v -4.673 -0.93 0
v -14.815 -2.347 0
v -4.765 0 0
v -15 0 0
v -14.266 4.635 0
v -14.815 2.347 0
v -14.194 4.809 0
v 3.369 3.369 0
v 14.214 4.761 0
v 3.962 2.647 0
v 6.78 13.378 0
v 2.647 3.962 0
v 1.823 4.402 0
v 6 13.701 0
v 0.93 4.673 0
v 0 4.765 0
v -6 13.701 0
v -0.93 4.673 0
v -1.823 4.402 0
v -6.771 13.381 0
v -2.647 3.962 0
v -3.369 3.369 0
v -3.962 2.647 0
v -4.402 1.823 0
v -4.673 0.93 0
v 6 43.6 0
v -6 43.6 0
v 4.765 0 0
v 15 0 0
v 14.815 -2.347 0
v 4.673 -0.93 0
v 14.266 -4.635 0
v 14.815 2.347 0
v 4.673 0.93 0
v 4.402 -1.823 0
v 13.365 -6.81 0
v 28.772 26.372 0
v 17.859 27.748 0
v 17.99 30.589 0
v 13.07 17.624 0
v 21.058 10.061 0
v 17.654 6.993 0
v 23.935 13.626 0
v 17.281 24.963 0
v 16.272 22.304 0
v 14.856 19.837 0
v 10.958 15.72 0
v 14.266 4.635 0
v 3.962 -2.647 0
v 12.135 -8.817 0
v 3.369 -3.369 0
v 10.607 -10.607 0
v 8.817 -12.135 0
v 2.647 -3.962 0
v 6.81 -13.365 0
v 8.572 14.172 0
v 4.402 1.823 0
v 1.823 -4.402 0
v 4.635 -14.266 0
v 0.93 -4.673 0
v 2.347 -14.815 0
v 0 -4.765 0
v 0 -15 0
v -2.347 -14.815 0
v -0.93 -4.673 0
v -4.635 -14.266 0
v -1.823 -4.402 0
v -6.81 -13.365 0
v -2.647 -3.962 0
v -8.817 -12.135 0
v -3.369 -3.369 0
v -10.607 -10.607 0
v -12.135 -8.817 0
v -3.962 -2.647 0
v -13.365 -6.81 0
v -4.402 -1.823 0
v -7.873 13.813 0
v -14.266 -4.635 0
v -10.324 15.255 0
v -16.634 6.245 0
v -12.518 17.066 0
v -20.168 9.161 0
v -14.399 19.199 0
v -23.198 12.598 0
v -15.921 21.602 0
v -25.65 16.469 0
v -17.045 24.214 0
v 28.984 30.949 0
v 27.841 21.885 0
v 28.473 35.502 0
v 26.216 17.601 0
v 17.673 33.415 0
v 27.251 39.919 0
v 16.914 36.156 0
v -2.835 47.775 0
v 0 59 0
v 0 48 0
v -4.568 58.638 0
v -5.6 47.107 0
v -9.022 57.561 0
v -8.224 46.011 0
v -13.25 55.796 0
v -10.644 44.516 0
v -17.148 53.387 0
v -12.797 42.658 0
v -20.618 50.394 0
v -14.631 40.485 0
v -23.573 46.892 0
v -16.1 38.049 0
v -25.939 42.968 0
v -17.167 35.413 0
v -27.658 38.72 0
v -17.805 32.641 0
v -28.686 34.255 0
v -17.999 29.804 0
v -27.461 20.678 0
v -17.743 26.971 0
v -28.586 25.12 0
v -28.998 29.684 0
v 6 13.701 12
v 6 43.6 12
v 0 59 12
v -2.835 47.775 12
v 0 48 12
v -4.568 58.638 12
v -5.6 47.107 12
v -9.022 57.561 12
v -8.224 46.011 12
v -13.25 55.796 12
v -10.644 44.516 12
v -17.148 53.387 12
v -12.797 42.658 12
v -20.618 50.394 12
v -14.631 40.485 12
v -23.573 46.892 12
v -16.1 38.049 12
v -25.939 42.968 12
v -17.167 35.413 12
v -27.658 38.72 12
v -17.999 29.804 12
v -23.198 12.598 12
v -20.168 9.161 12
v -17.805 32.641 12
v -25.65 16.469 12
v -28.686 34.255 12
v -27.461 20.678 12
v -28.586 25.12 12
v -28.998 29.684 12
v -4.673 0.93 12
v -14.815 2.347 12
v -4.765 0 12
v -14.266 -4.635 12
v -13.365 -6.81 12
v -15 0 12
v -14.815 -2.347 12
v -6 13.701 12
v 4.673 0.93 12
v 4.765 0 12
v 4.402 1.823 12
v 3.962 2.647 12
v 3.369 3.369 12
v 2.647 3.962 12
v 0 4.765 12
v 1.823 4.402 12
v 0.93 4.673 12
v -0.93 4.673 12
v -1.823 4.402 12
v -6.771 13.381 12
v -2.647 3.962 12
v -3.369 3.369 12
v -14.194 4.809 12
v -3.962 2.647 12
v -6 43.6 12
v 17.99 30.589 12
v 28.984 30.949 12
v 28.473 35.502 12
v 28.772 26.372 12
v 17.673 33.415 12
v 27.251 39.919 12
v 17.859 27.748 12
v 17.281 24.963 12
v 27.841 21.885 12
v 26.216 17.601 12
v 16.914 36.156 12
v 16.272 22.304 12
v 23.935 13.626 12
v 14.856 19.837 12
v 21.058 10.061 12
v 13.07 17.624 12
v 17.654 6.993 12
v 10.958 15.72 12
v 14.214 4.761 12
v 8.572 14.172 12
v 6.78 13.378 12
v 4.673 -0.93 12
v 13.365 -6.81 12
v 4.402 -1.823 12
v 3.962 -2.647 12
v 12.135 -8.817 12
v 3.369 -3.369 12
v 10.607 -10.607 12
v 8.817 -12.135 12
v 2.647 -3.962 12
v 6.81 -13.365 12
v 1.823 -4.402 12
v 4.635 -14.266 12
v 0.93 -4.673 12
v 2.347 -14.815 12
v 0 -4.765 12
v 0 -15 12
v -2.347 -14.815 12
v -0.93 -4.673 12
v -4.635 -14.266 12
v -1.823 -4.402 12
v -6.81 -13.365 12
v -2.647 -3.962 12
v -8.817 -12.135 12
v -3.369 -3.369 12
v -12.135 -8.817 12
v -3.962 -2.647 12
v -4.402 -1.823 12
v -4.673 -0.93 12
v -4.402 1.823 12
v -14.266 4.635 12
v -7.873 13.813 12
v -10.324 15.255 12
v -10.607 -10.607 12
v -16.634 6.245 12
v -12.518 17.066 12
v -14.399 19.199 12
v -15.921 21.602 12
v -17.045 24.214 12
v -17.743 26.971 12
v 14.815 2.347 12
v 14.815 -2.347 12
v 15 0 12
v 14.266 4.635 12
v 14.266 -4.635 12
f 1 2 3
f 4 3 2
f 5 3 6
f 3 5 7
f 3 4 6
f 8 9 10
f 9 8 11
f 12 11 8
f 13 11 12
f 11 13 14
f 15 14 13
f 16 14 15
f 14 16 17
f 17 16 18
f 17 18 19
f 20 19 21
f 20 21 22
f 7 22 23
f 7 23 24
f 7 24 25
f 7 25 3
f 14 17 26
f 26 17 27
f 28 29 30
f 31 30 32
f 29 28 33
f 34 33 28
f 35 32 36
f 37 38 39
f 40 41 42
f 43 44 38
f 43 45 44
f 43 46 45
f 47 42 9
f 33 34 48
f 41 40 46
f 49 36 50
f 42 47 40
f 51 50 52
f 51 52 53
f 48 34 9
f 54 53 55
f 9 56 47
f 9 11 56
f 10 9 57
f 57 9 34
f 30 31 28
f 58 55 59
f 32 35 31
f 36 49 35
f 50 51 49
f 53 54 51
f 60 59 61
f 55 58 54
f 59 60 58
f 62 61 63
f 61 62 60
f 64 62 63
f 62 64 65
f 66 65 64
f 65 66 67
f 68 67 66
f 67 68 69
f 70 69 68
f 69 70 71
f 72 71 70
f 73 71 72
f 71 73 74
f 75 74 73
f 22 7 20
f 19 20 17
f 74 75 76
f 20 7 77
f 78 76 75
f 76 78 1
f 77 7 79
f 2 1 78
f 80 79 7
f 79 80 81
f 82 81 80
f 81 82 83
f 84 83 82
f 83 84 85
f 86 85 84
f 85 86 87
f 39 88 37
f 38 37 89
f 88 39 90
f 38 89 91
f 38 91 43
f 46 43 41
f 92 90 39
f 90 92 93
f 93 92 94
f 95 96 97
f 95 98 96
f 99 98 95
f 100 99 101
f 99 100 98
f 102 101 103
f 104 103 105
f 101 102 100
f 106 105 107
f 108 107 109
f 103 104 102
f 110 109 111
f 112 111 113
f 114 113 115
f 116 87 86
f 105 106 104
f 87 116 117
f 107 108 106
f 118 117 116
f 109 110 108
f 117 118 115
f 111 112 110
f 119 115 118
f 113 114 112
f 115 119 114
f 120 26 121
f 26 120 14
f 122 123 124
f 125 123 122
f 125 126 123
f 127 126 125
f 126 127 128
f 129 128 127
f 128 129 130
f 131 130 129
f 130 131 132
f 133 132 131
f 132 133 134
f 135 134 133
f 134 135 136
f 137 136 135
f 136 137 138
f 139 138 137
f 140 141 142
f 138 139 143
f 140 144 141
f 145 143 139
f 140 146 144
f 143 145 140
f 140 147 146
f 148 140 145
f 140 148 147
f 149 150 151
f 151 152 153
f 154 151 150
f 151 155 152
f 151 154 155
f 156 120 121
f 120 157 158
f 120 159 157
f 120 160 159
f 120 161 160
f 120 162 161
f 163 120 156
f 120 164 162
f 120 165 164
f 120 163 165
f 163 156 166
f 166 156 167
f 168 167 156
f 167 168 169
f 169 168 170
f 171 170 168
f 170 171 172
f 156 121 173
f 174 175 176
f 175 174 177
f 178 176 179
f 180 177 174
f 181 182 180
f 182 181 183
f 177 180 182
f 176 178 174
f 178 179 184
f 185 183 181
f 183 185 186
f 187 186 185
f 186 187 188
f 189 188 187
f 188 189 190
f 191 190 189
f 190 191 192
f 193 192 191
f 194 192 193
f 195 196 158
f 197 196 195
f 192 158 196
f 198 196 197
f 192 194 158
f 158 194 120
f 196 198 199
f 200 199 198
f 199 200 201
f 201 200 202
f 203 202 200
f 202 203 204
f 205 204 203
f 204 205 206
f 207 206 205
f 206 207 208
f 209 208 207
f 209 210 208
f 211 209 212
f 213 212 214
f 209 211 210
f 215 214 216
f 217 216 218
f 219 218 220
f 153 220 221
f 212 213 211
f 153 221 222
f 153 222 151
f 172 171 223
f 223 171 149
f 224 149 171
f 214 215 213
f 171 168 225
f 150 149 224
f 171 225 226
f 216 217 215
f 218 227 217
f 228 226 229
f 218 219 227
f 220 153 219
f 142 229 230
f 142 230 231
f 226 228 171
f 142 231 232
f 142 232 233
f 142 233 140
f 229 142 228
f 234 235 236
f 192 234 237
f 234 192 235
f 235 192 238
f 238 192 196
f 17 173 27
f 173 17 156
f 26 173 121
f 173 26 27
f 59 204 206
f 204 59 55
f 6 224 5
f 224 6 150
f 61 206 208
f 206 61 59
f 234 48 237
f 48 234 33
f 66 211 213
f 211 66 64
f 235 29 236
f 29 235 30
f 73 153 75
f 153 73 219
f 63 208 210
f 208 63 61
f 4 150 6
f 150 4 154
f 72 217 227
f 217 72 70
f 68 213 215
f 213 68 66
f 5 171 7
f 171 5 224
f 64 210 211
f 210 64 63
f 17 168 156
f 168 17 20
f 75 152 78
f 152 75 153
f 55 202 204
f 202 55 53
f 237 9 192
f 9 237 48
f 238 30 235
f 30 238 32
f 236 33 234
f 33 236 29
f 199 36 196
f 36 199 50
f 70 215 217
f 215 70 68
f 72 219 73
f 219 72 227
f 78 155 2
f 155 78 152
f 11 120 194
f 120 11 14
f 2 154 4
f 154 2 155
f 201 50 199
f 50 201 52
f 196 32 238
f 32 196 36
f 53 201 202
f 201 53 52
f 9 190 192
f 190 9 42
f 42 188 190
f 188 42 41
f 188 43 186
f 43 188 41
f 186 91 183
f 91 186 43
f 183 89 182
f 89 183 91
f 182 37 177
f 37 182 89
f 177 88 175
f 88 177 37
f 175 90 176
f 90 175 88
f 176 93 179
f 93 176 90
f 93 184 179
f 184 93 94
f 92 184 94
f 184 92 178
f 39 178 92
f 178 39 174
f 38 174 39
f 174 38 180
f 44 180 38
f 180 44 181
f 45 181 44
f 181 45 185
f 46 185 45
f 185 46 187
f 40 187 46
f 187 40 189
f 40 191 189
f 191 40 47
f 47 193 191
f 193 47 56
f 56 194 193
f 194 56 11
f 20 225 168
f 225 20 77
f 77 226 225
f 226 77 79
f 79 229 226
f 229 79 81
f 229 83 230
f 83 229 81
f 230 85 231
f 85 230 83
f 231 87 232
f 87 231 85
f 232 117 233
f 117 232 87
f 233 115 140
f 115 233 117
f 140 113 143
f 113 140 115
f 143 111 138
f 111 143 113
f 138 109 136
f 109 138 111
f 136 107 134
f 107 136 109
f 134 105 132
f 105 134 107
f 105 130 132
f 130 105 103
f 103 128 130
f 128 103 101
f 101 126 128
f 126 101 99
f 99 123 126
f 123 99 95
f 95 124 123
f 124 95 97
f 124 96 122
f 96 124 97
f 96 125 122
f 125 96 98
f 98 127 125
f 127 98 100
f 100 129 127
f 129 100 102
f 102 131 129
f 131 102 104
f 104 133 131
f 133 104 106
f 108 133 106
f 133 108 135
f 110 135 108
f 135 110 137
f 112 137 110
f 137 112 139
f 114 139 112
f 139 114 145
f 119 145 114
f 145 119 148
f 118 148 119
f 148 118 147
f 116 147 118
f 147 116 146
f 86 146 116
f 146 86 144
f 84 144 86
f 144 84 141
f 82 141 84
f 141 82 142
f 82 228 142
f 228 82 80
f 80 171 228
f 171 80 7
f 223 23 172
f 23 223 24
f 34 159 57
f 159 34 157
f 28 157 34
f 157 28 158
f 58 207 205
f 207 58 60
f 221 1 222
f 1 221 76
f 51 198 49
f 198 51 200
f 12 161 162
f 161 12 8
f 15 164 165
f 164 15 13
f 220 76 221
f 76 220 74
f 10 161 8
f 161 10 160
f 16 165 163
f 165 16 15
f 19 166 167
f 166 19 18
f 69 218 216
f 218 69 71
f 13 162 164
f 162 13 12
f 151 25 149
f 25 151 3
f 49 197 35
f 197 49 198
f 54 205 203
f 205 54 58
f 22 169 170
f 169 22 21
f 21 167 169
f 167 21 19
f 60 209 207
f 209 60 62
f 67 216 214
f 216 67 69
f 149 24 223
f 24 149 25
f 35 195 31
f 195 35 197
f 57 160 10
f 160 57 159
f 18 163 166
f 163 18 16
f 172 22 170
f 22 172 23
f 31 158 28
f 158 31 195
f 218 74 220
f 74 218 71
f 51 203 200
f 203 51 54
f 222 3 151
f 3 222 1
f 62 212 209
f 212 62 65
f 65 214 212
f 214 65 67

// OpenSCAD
$fn = 32;

// ----------------------------------------------------------------------
// Hook: 60 mm shank into a 18 mm curl, 12 mm thick
// ----------------------------------------------------------------------

// --- parameters (mm) ---
shank_len = 60;           // shank length from the boss centre
shank_w = 12;             // shank width
boss_d = 30;              // boss diameter
bore_d = 9.53;            // boss bore
curl_in = 18;             // curl inner radius
curl_out = 29;            // curl outer radius
curl_sweep = 290;         // curl sweep angle
hook_t = 12;              // hook thickness

shank_profile = [[-6, 43.6], [6, 43.6], [6, 13], [-6, 13]];
boss_profile = [[15, 0], [14.815, 2.347], [14.266, 4.635], [13.365, 6.81], [12.135, 8.817], [10.607, 10.607], [8.817, 12.135], [6.81, 13.365], [4.635, 14.266], [2.347, 14.815], [0, 15], [-2.347, 14.815], [-4.635, 14.266], [-6.81, 13.365], [-8.817, 12.135], [-10.607, 10.607], [-12.135, 8.817], [-13.365, 6.81], [-14.266, 4.635], [-14.815, 2.347], [-15, 0], [-14.815, -2.347], [-14.266, -4.635], [-13.365, -6.81], [-12.135, -8.817], [-10.607, -10.607], [-8.817, -12.135], [-6.81, -13.365], [-4.635, -14.266], [-2.347, -14.815], [0, -15], [2.347, -14.815], [4.635, -14.266], [6.81, -13.365], [8.817, -12.135], [10.607, -10.607], [12.135, -8.817], [13.365, -6.81], [14.266, -4.635], [14.815, -2.347]];
curl_profile = [[0, 59], [-4.568, 58.638], [-9.022, 57.561], [-13.25, 55.796], [-17.148, 53.387], [-20.618, 50.394], [-23.573, 46.892], [-25.939, 42.968], [-27.658, 38.72], [-28.686, 34.255], [-28.998, 29.684], [-28.586, 25.12], [-27.461, 20.678], [-25.65, 16.469], [-23.198, 12.598], [-20.168, 9.161], [-16.634, 6.245], [-12.684, 3.921], [-8.418, 2.249], [-3.942, 1.269], [0.633, 1.007], [5.191, 1.468], [9.621, 2.642], [13.81, 4.499], [17.654, 6.993], [21.058, 10.061], [23.935, 13.626], [26.216, 17.601], [27.841, 21.885], [28.772, 26.372], [28.984, 30.949], [28.473, 35.502], [27.251, 39.919], [16.914, 36.156], [17.673, 33.415], [17.99, 30.589], [17.859, 27.748], [17.281, 24.963], [16.272, 22.304], [14.856, 19.837], [13.07, 17.624], [10.958, 15.72], [8.572, 14.172], [5.971, 13.019], [3.222, 12.291], [0.393, 12.004], [-2.447, 12.167], [-5.225, 12.775], [-7.873, 13.813], [-10.324, 15.255], [-12.518, 17.066], [-14.399, 19.199], [-15.921, 21.602], [-17.045, 24.214], [-17.743, 26.971], [-17.999, 29.804], [-17.805, 32.641], [-17.167, 35.413], [-16.1, 38.049], [-14.631, 40.485], [-12.797, 42.658], [-10.644, 44.516], [-8.224, 46.011], [-5.6, 47.107], [-2.835, 47.775], [0, 48]];

difference() {
  union() {
    /* three overlapping outlines: shank, boss and the smooth curl */
    linear_extrude(height = hook_t) polygon(shank_profile);
    linear_extrude(height = hook_t) polygon(boss_profile);
    linear_extrude(height = hook_t) polygon(curl_profile);
  }
  translate([0, 0, -2.5]) cylinder(h = hook_t + 5, d = bore_d);
}
